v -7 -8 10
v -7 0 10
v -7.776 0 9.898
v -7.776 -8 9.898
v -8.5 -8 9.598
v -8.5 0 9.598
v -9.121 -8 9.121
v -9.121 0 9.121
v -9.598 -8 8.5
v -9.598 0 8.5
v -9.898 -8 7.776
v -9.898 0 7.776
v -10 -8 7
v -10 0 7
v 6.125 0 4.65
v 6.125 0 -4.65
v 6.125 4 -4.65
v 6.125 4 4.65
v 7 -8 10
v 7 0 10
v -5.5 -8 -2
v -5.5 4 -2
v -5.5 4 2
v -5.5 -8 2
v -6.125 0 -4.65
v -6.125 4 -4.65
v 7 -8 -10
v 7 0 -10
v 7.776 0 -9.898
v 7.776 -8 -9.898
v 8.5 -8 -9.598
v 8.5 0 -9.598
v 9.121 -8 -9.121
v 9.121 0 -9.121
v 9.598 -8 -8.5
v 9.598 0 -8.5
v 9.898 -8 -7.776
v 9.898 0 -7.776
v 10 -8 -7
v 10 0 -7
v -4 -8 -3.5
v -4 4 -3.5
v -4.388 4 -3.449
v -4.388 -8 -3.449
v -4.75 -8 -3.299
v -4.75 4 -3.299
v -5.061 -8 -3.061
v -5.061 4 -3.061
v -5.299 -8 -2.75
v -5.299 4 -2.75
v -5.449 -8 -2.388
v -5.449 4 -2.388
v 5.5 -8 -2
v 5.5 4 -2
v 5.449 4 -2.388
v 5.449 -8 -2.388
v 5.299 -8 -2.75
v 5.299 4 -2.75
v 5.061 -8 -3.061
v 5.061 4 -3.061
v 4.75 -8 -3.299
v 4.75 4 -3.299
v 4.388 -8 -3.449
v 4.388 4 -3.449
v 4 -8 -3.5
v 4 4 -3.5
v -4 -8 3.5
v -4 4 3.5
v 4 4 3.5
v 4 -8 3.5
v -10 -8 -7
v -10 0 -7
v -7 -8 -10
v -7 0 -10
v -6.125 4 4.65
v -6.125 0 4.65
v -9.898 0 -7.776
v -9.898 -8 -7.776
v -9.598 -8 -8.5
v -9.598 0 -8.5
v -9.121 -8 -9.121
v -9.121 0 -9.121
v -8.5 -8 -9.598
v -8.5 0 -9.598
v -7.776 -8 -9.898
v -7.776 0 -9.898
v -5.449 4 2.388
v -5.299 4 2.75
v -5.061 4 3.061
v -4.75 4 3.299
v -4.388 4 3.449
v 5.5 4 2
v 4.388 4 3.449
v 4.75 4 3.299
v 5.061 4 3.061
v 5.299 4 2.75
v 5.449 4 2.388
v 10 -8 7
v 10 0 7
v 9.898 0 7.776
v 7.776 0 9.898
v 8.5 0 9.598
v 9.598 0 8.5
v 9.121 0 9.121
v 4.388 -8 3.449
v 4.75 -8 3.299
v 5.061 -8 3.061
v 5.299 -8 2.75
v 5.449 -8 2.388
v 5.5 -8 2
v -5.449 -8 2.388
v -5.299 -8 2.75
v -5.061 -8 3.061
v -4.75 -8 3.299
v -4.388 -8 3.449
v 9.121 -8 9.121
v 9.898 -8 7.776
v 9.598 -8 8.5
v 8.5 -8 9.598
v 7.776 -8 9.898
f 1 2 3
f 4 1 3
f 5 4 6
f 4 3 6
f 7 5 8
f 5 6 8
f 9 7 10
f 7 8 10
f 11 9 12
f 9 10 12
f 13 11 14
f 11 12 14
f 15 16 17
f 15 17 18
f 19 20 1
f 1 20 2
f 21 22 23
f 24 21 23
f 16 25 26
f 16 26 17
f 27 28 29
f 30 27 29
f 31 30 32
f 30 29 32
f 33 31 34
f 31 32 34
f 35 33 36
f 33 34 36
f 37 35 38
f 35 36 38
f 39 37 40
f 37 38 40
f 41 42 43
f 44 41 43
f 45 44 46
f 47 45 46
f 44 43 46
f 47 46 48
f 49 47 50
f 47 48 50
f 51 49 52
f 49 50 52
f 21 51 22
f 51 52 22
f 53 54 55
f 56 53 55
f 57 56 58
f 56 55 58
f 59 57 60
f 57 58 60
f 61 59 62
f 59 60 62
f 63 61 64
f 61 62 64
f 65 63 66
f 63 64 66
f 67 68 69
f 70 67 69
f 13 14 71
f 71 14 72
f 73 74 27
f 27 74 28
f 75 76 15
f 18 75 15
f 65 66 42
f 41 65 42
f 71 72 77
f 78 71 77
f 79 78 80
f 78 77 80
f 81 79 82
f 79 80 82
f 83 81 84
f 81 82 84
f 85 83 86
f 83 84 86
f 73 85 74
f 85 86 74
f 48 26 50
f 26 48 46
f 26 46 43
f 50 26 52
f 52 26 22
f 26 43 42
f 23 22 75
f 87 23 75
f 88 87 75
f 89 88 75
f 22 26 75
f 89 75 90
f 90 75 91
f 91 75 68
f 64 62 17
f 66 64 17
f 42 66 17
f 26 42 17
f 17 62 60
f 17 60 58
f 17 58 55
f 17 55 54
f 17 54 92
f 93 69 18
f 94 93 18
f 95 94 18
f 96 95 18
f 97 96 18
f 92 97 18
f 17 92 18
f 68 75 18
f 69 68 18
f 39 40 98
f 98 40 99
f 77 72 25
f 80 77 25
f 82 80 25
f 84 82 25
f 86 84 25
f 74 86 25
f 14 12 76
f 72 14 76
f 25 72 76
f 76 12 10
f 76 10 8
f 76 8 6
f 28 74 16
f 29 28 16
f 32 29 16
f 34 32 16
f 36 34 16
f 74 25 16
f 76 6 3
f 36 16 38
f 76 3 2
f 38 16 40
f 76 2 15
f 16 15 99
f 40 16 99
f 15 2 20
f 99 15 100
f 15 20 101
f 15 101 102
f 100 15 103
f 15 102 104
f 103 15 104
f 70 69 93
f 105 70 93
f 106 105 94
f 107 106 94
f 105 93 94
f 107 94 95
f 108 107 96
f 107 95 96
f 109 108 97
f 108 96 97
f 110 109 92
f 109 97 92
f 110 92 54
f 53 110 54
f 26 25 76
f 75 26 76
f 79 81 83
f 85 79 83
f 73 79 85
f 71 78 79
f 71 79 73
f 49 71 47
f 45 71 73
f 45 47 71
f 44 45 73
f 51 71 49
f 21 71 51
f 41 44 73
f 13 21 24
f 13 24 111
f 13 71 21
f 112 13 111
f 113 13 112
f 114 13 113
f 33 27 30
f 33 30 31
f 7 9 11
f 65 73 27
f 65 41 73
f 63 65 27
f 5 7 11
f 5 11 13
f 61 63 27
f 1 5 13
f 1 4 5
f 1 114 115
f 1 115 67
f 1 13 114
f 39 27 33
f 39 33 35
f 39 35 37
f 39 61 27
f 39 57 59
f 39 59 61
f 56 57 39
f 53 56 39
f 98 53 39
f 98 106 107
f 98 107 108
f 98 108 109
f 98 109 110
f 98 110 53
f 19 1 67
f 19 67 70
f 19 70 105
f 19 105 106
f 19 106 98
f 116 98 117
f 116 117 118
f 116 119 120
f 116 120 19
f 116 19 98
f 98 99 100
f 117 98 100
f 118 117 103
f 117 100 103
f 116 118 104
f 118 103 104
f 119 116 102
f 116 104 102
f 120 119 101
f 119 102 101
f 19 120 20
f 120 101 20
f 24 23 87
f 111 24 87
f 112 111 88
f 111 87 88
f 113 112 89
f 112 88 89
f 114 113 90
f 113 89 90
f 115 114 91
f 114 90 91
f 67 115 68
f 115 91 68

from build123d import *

# Parameters (mm, degrees)
F1_DEPTH = 8
F2_W     = 12.25
F2_H     = 9.3
F3_DEPTH = 4
F5_DEPTH = 25


with BuildPart() as f1:
    # F0 (on Front) → F1 (new body)
    with BuildSketch(Plane.XZ):
        with BuildLine():
            ThreePointArc((10, 7), (9.12132, 9.12132), (7, 10))
            Line((7, 10), (-7, 10))
            ThreePointArc((-7, 10), (-9.12132, 9.12132), (-10, 7))
            Line((-10, 7), (-10, -7))
            ThreePointArc((-10, -7), (-9.12132, -9.12132), (-7, -10))
            Line((-7, -10), (7, -10))
            ThreePointArc((7, -10), (9.12132, -9.12132), (10, -7))
            Line((10, -7), (10, 7))
        make_face()
    extrude(amount=F1_DEPTH)

    # F2 (on Front) → F3 (join)
    with BuildSketch(Plane.XZ):
        Rectangle(F2_W, F2_H)
    extrude(amount=-F3_DEPTH)

    # F4 (on face) → F5 (cut)
    with BuildSketch(Plane(origin=(0, 4, 0), x_dir=(-1, 0, 0), z_dir=(0, 1, 0))):
        with BuildLine():
            ThreePointArc((5.5, 2), (5.06066, 3.06066), (4, 3.5))
            Line((4, 3.5), (-4, 3.5))
            ThreePointArc((-4, 3.5), (-5.06066, 3.06066), (-5.5, 2))
            Line((-5.5, 2), (-5.5, -2))
            ThreePointArc((-5.5, -2), (-5.06066, -3.06066), (-4, -3.5))
            Line((-4, -3.5), (4, -3.5))
            ThreePointArc((4, -3.5), (5.06066, -3.06066), (5.5, -2))
            Line((5.5, -2), (5.5, 2))
        make_face()
    extrude(amount=-F5_DEPTH, mode=Mode.SUBTRACT)


solid = f1.part
